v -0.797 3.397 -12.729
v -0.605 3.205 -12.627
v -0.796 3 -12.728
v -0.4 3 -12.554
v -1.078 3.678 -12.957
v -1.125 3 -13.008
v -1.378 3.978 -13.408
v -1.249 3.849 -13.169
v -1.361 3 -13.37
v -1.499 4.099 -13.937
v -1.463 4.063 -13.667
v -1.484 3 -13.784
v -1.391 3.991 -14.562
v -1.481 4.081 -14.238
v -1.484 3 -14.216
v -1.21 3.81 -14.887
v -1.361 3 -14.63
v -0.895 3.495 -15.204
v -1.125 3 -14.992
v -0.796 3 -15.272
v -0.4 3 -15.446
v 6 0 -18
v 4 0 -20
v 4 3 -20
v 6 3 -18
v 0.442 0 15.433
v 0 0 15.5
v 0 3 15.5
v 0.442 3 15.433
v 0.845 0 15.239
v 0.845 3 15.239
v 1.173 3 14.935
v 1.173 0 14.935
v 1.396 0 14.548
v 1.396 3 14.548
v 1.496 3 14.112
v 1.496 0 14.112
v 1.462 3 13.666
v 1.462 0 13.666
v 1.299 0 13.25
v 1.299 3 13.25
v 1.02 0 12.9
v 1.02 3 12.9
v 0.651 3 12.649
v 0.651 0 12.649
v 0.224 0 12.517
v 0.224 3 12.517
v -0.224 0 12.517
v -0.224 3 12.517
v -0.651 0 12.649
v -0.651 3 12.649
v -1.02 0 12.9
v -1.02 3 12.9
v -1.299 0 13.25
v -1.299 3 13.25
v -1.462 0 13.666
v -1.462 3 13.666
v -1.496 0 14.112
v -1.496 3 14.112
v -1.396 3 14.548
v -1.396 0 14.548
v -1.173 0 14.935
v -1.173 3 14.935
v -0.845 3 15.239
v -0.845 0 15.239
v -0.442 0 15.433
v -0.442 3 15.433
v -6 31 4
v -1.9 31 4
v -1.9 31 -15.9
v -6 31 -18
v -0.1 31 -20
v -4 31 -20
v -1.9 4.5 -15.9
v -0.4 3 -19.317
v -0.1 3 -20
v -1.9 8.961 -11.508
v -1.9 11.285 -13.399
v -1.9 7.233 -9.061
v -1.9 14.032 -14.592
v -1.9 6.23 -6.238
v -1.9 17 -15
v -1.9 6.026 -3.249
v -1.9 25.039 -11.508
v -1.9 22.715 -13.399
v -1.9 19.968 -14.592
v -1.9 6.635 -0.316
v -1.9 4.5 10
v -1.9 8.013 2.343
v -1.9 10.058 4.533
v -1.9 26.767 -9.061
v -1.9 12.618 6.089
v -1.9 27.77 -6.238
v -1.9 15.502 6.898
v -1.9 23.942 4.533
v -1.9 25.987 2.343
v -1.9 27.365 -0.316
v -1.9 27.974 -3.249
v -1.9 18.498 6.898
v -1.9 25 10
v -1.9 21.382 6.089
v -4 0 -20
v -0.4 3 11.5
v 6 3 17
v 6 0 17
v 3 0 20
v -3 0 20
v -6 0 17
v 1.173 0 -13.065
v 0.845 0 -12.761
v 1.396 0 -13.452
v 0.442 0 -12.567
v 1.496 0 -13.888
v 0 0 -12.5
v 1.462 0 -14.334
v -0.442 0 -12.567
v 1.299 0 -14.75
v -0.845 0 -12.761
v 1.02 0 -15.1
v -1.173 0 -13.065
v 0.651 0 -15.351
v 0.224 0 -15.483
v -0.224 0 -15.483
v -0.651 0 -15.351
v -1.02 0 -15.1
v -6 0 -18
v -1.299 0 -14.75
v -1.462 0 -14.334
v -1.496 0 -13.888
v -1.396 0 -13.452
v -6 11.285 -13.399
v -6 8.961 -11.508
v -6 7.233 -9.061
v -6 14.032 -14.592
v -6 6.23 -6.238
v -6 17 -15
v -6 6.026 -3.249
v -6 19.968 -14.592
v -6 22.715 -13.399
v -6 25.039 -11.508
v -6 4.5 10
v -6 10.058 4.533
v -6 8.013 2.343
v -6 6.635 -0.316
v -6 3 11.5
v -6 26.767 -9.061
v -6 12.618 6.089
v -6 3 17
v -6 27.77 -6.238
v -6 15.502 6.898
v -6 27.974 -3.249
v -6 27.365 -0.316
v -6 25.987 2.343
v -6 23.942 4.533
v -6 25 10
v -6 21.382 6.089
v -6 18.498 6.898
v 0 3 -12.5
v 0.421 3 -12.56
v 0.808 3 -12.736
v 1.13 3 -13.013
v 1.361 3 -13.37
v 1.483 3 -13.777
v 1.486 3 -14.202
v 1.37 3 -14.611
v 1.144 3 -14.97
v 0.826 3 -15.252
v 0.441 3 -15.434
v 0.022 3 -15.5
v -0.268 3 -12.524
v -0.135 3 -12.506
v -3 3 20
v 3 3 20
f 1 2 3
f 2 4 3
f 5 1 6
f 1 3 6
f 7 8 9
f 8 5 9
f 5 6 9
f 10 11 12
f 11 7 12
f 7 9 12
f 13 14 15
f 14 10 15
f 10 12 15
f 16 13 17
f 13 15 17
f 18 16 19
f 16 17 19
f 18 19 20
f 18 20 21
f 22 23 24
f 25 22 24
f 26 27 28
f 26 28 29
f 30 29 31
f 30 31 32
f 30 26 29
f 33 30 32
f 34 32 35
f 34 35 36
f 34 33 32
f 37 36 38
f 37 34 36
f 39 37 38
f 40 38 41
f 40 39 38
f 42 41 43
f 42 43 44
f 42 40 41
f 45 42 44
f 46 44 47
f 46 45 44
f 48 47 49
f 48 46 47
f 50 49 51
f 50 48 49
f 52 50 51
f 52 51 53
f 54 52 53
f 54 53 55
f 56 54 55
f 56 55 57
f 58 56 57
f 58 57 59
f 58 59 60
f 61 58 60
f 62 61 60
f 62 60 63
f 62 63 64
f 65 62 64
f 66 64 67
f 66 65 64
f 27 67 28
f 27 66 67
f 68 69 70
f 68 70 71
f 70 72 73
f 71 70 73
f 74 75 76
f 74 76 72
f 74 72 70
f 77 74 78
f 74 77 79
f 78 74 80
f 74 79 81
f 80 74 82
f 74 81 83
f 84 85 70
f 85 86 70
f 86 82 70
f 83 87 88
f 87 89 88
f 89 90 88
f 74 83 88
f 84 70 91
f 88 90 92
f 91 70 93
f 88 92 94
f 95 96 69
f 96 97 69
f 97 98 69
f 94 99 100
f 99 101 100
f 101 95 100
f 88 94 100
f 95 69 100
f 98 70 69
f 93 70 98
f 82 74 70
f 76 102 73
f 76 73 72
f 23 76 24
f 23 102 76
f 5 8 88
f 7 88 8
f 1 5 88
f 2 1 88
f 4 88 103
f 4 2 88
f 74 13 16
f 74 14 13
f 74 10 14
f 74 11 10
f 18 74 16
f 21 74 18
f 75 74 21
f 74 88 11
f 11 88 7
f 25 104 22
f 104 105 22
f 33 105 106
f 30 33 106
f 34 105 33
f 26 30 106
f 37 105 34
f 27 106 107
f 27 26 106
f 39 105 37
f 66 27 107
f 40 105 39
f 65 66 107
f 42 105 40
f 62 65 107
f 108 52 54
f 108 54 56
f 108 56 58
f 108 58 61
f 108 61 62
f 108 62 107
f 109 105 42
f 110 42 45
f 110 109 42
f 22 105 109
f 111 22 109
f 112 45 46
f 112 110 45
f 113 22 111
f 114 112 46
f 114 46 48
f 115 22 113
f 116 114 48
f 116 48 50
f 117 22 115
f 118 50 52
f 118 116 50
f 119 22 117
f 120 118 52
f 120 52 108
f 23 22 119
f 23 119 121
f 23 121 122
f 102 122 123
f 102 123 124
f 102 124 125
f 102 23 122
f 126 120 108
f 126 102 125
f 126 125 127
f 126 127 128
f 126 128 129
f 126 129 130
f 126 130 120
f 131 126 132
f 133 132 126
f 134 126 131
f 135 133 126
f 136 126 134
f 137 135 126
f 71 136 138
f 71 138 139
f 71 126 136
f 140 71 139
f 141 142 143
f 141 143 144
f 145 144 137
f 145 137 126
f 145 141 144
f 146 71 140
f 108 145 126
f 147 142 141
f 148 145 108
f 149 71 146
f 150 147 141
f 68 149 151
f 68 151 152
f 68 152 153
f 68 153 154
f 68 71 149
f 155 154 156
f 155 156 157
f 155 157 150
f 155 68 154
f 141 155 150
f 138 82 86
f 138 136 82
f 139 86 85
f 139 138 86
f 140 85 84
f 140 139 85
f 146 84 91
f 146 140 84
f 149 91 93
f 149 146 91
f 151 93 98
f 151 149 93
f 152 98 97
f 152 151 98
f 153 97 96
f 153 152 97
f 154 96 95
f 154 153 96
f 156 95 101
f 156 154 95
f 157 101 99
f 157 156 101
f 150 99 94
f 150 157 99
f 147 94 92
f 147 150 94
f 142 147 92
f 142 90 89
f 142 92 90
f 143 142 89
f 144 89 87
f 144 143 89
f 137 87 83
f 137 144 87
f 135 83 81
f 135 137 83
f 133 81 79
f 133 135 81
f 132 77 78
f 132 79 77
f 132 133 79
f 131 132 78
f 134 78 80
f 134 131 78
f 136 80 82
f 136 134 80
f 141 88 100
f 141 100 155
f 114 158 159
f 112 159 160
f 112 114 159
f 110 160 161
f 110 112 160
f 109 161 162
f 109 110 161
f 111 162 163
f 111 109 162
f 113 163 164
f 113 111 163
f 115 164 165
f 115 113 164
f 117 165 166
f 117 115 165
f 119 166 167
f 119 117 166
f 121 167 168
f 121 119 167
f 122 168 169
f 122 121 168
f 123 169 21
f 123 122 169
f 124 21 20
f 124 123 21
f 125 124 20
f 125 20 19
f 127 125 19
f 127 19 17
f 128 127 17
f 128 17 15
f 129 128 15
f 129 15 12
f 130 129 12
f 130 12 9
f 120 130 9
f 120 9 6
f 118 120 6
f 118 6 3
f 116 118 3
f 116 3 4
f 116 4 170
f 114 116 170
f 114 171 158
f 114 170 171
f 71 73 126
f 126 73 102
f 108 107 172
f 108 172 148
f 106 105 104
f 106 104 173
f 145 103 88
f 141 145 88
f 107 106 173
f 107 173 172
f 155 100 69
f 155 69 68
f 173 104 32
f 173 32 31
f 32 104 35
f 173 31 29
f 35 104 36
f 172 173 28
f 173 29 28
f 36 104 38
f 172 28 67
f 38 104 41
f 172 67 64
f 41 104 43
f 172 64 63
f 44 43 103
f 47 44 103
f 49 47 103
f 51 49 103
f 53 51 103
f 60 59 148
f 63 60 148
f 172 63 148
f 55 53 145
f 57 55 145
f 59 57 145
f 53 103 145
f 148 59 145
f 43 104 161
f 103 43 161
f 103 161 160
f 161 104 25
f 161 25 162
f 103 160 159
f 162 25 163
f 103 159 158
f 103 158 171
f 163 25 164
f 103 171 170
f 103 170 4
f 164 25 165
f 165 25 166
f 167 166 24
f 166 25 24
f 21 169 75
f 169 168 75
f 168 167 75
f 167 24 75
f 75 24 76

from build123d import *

# Parameters (mm, degrees)
SKETCH1_R                = 1.5
BOSS_EXTRUDE1_DEPTH      = 3
BOSS_EXTRUDE2_DEPTH      = 28
CHAMFER1_SIZE            = 2
SKETCH4_R                = 11
CUT_EXTRUDE1_DEPTH       = 11
CHAMFER2_SIZE            = 6
CHAMFER2_OF_MIRROR3_SIZE = 6
CHAMFER3_SIZE            = 2
SKETCH5_W                = 30
SKETCH5_H                = 28
CUT_EXTRUDE2_DEPTH       = 11
CHAMFER4_SIZE            = 1.5


with BuildPart() as part:
    # Sketch1 → Boss-Extrude1 (new body)
    with BuildSketch(Plane(origin=(0, 0, 0), x_dir=(1, 0, 0), z_dir=(0, 1, 0))):
        Polygon((-6, 20), (6, 20), (6, -17), (3, -20), (-3, -20), (-6, -17), align=None)
        with Locations(Location((0, 14, 0), (0, 0, 270))):
            Circle(SKETCH1_R, mode=Mode.SUBTRACT)
        with Locations(Location((0, -14, 0), (0, 0, 270))):
            Circle(SKETCH1_R, mode=Mode.SUBTRACT)
    extrude(amount=BOSS_EXTRUDE1_DEPTH)

    # Sketch2 → Boss-Extrude2 (add)
    with BuildSketch(Plane(origin=(0, 3, 0), x_dir=(1, 0, 0), z_dir=(0, 1, 0))):
        Polygon((6, -10), (6, 20), (0.1, 20), (1.9, 15.9), (1.9, -10), align=None)
    boss_extrude2 = extrude(amount=BOSS_EXTRUDE2_DEPTH)

    # Chamfer1
    chamfer1_edges = [part.edges().sort_by_distance(p)[0] for p in [
        (6, 15.5, -20),
    ]]
    chamfer(chamfer1_edges, length=CHAMFER1_SIZE)

    # Sketch4 → Cut-Extrude1 (cut)
    with BuildSketch(Plane(origin=(6, 0, 0), x_dir=(0, 0, -1), z_dir=(1, 0, 0))):
        with Locations((4, 17)):
            Circle(SKETCH4_R)
    cut_extrude1 = extrude(amount=-CUT_EXTRUDE1_DEPTH, mode=Mode.SUBTRACT)

    # Chamfer2
    chamfer2_edges = [part.edges().sort_by_distance(p)[0] for p in [
        (3.95, 31, 10),
    ]]
    chamfer(chamfer2_edges, length=CHAMFER2_SIZE)

    # Mirror3: Boss-Extrude2, Cut-Extrude1 across plane
    add(boss_extrude2.mirror(Plane(origin=(0, 0, 0), x_dir=(0, 0, 1), z_dir=(1, 0, 0))))
    add(cut_extrude1.mirror(Plane(origin=(0, 0, 0), x_dir=(0, 0, 1), z_dir=(1, 0, 0))), mode=Mode.SUBTRACT)

    # Chamfer2 of Mirror3
    chamfer2_of_mirror3_edges = [part.edges().sort_by_distance(p)[0] for p in [
        (-3.95, 31, 10),
    ]]
    chamfer(chamfer2_of_mirror3_edges, length=CHAMFER2_OF_MIRROR3_SIZE)

    # Chamfer3
    chamfer3_edges = [part.edges().sort_by_distance(p)[0] for p in [
        (-6, 15.5, -20),
    ]]
    chamfer(chamfer3_edges, length=CHAMFER3_SIZE)

    # Sketch5 → Cut-Extrude2 (cut)
    with BuildSketch(Plane(origin=(0, 0, 0), x_dir=(0, 0, -1), z_dir=(1, 0, 0))):
        with Locations((5, 17)):
            Rectangle(SKETCH5_W, SKETCH5_H)
    extrude(amount=CUT_EXTRUDE2_DEPTH, mode=Mode.SUBTRACT)

    # Chamfer4
    # the kernel refuses this chamfer: 1.5 mm, written as the material it adds along each edge
    with BuildSketch(Plane(origin=(-1.9, 3, 10), x_dir=(0, -0.02749587661058648, 0.9996219169112968), z_dir=(-1, 0, 0))) as chamfer4_piece_1:
        Polygon((CHAMFER4_SIZE * 0.999621916911, CHAMFER4_SIZE * 0.0274958766106), (-CHAMFER4_SIZE * 0.0274958766106, CHAMFER4_SIZE * 0.999621916911), (0, 0), align=None)
    extrude(amount=4.1)
    with BuildSketch(Plane(origin=(-1.9, 3, -19.757524482), x_dir=(-0.02749587661058635, 0.9996219169112968, 0), z_dir=(0, 0, 1))) as chamfer4_piece_2_section:
        Polygon((CHAMFER4_SIZE * 0.999621916911, -CHAMFER4_SIZE * 0.0274958766106), (-CHAMFER4_SIZE * 0.0274958766106, -CHAMFER4_SIZE * 0.999621916911), (0, 0), align=None)
    chamfer4_piece_2 = extrude(amount=29.757524482, mode=Mode.PRIVATE)
    chamfer4_piece_2 = chamfer4_piece_2 - Plane(origin=(0, 3.558405008, -14), x_dir=(0, 0, 1), z_dir=(0, -1, 0)) * Cylinder(1.5, 66, mode=Mode.PRIVATE)
    add(chamfer4_piece_2)
    with BuildSketch(Plane(origin=(-1.9, 3, -19.757524482), x_dir=(-0.02749587661058635, 0.9996219169112968, 0), z_dir=(0, 0, 1))) as chamfer4_piece_3a_section:
        Polygon((CHAMFER4_SIZE * 0.999621916911, -CHAMFER4_SIZE * 0.0274958766106), (-CHAMFER4_SIZE * 0.0274958766106, -CHAMFER4_SIZE * 0.999621916911), (0, 0), align=None)
    chamfer4_piece_3a = extrude(amount=33.615048964, mode=Mode.PRIVATE)
    chamfer4_piece_3a = split(chamfer4_piece_3a, bisect_by=Plane(origin=(-1.452850979, 3.51967463, 10), z_dir=(0, 0, 1)), keep=Keep.TOP, mode=Mode.PRIVATE)
    chamfer4_piece_3a = chamfer4_piece_3a - Plane(origin=(0, 3.51967463, 14), x_dir=(0, 0, 1), z_dir=(0, -1, 0)) * Cylinder(1.5, 74, mode=Mode.PRIVATE)
    with BuildSketch(Plane(origin=(1.957524482, 3, 10), x_dir=(0, -0.02749587661058648, 0.9996219169112968), z_dir=(-1, 0, 0))) as chamfer4_piece_3b_section:
        Polygon((CHAMFER4_SIZE * 0.999621916911, CHAMFER4_SIZE * 0.0274958766106), (-CHAMFER4_SIZE * 0.0274958766106, CHAMFER4_SIZE * 0.999621916911), (0, 0), align=None)
    chamfer4_piece_3b = extrude(amount=7.957524482, mode=Mode.PRIVATE)
    chamfer4_piece_3b = split(chamfer4_piece_3b, bisect_by=Plane(origin=(-1.9, 3.49469044, 10.49469044), z_dir=(1, 0, 0)), keep=Keep.TOP, mode=Mode.PRIVATE)
    chamfer4_piece_3 = chamfer4_piece_3a & chamfer4_piece_3b
    add(chamfer4_piece_3)


solid = part.part
